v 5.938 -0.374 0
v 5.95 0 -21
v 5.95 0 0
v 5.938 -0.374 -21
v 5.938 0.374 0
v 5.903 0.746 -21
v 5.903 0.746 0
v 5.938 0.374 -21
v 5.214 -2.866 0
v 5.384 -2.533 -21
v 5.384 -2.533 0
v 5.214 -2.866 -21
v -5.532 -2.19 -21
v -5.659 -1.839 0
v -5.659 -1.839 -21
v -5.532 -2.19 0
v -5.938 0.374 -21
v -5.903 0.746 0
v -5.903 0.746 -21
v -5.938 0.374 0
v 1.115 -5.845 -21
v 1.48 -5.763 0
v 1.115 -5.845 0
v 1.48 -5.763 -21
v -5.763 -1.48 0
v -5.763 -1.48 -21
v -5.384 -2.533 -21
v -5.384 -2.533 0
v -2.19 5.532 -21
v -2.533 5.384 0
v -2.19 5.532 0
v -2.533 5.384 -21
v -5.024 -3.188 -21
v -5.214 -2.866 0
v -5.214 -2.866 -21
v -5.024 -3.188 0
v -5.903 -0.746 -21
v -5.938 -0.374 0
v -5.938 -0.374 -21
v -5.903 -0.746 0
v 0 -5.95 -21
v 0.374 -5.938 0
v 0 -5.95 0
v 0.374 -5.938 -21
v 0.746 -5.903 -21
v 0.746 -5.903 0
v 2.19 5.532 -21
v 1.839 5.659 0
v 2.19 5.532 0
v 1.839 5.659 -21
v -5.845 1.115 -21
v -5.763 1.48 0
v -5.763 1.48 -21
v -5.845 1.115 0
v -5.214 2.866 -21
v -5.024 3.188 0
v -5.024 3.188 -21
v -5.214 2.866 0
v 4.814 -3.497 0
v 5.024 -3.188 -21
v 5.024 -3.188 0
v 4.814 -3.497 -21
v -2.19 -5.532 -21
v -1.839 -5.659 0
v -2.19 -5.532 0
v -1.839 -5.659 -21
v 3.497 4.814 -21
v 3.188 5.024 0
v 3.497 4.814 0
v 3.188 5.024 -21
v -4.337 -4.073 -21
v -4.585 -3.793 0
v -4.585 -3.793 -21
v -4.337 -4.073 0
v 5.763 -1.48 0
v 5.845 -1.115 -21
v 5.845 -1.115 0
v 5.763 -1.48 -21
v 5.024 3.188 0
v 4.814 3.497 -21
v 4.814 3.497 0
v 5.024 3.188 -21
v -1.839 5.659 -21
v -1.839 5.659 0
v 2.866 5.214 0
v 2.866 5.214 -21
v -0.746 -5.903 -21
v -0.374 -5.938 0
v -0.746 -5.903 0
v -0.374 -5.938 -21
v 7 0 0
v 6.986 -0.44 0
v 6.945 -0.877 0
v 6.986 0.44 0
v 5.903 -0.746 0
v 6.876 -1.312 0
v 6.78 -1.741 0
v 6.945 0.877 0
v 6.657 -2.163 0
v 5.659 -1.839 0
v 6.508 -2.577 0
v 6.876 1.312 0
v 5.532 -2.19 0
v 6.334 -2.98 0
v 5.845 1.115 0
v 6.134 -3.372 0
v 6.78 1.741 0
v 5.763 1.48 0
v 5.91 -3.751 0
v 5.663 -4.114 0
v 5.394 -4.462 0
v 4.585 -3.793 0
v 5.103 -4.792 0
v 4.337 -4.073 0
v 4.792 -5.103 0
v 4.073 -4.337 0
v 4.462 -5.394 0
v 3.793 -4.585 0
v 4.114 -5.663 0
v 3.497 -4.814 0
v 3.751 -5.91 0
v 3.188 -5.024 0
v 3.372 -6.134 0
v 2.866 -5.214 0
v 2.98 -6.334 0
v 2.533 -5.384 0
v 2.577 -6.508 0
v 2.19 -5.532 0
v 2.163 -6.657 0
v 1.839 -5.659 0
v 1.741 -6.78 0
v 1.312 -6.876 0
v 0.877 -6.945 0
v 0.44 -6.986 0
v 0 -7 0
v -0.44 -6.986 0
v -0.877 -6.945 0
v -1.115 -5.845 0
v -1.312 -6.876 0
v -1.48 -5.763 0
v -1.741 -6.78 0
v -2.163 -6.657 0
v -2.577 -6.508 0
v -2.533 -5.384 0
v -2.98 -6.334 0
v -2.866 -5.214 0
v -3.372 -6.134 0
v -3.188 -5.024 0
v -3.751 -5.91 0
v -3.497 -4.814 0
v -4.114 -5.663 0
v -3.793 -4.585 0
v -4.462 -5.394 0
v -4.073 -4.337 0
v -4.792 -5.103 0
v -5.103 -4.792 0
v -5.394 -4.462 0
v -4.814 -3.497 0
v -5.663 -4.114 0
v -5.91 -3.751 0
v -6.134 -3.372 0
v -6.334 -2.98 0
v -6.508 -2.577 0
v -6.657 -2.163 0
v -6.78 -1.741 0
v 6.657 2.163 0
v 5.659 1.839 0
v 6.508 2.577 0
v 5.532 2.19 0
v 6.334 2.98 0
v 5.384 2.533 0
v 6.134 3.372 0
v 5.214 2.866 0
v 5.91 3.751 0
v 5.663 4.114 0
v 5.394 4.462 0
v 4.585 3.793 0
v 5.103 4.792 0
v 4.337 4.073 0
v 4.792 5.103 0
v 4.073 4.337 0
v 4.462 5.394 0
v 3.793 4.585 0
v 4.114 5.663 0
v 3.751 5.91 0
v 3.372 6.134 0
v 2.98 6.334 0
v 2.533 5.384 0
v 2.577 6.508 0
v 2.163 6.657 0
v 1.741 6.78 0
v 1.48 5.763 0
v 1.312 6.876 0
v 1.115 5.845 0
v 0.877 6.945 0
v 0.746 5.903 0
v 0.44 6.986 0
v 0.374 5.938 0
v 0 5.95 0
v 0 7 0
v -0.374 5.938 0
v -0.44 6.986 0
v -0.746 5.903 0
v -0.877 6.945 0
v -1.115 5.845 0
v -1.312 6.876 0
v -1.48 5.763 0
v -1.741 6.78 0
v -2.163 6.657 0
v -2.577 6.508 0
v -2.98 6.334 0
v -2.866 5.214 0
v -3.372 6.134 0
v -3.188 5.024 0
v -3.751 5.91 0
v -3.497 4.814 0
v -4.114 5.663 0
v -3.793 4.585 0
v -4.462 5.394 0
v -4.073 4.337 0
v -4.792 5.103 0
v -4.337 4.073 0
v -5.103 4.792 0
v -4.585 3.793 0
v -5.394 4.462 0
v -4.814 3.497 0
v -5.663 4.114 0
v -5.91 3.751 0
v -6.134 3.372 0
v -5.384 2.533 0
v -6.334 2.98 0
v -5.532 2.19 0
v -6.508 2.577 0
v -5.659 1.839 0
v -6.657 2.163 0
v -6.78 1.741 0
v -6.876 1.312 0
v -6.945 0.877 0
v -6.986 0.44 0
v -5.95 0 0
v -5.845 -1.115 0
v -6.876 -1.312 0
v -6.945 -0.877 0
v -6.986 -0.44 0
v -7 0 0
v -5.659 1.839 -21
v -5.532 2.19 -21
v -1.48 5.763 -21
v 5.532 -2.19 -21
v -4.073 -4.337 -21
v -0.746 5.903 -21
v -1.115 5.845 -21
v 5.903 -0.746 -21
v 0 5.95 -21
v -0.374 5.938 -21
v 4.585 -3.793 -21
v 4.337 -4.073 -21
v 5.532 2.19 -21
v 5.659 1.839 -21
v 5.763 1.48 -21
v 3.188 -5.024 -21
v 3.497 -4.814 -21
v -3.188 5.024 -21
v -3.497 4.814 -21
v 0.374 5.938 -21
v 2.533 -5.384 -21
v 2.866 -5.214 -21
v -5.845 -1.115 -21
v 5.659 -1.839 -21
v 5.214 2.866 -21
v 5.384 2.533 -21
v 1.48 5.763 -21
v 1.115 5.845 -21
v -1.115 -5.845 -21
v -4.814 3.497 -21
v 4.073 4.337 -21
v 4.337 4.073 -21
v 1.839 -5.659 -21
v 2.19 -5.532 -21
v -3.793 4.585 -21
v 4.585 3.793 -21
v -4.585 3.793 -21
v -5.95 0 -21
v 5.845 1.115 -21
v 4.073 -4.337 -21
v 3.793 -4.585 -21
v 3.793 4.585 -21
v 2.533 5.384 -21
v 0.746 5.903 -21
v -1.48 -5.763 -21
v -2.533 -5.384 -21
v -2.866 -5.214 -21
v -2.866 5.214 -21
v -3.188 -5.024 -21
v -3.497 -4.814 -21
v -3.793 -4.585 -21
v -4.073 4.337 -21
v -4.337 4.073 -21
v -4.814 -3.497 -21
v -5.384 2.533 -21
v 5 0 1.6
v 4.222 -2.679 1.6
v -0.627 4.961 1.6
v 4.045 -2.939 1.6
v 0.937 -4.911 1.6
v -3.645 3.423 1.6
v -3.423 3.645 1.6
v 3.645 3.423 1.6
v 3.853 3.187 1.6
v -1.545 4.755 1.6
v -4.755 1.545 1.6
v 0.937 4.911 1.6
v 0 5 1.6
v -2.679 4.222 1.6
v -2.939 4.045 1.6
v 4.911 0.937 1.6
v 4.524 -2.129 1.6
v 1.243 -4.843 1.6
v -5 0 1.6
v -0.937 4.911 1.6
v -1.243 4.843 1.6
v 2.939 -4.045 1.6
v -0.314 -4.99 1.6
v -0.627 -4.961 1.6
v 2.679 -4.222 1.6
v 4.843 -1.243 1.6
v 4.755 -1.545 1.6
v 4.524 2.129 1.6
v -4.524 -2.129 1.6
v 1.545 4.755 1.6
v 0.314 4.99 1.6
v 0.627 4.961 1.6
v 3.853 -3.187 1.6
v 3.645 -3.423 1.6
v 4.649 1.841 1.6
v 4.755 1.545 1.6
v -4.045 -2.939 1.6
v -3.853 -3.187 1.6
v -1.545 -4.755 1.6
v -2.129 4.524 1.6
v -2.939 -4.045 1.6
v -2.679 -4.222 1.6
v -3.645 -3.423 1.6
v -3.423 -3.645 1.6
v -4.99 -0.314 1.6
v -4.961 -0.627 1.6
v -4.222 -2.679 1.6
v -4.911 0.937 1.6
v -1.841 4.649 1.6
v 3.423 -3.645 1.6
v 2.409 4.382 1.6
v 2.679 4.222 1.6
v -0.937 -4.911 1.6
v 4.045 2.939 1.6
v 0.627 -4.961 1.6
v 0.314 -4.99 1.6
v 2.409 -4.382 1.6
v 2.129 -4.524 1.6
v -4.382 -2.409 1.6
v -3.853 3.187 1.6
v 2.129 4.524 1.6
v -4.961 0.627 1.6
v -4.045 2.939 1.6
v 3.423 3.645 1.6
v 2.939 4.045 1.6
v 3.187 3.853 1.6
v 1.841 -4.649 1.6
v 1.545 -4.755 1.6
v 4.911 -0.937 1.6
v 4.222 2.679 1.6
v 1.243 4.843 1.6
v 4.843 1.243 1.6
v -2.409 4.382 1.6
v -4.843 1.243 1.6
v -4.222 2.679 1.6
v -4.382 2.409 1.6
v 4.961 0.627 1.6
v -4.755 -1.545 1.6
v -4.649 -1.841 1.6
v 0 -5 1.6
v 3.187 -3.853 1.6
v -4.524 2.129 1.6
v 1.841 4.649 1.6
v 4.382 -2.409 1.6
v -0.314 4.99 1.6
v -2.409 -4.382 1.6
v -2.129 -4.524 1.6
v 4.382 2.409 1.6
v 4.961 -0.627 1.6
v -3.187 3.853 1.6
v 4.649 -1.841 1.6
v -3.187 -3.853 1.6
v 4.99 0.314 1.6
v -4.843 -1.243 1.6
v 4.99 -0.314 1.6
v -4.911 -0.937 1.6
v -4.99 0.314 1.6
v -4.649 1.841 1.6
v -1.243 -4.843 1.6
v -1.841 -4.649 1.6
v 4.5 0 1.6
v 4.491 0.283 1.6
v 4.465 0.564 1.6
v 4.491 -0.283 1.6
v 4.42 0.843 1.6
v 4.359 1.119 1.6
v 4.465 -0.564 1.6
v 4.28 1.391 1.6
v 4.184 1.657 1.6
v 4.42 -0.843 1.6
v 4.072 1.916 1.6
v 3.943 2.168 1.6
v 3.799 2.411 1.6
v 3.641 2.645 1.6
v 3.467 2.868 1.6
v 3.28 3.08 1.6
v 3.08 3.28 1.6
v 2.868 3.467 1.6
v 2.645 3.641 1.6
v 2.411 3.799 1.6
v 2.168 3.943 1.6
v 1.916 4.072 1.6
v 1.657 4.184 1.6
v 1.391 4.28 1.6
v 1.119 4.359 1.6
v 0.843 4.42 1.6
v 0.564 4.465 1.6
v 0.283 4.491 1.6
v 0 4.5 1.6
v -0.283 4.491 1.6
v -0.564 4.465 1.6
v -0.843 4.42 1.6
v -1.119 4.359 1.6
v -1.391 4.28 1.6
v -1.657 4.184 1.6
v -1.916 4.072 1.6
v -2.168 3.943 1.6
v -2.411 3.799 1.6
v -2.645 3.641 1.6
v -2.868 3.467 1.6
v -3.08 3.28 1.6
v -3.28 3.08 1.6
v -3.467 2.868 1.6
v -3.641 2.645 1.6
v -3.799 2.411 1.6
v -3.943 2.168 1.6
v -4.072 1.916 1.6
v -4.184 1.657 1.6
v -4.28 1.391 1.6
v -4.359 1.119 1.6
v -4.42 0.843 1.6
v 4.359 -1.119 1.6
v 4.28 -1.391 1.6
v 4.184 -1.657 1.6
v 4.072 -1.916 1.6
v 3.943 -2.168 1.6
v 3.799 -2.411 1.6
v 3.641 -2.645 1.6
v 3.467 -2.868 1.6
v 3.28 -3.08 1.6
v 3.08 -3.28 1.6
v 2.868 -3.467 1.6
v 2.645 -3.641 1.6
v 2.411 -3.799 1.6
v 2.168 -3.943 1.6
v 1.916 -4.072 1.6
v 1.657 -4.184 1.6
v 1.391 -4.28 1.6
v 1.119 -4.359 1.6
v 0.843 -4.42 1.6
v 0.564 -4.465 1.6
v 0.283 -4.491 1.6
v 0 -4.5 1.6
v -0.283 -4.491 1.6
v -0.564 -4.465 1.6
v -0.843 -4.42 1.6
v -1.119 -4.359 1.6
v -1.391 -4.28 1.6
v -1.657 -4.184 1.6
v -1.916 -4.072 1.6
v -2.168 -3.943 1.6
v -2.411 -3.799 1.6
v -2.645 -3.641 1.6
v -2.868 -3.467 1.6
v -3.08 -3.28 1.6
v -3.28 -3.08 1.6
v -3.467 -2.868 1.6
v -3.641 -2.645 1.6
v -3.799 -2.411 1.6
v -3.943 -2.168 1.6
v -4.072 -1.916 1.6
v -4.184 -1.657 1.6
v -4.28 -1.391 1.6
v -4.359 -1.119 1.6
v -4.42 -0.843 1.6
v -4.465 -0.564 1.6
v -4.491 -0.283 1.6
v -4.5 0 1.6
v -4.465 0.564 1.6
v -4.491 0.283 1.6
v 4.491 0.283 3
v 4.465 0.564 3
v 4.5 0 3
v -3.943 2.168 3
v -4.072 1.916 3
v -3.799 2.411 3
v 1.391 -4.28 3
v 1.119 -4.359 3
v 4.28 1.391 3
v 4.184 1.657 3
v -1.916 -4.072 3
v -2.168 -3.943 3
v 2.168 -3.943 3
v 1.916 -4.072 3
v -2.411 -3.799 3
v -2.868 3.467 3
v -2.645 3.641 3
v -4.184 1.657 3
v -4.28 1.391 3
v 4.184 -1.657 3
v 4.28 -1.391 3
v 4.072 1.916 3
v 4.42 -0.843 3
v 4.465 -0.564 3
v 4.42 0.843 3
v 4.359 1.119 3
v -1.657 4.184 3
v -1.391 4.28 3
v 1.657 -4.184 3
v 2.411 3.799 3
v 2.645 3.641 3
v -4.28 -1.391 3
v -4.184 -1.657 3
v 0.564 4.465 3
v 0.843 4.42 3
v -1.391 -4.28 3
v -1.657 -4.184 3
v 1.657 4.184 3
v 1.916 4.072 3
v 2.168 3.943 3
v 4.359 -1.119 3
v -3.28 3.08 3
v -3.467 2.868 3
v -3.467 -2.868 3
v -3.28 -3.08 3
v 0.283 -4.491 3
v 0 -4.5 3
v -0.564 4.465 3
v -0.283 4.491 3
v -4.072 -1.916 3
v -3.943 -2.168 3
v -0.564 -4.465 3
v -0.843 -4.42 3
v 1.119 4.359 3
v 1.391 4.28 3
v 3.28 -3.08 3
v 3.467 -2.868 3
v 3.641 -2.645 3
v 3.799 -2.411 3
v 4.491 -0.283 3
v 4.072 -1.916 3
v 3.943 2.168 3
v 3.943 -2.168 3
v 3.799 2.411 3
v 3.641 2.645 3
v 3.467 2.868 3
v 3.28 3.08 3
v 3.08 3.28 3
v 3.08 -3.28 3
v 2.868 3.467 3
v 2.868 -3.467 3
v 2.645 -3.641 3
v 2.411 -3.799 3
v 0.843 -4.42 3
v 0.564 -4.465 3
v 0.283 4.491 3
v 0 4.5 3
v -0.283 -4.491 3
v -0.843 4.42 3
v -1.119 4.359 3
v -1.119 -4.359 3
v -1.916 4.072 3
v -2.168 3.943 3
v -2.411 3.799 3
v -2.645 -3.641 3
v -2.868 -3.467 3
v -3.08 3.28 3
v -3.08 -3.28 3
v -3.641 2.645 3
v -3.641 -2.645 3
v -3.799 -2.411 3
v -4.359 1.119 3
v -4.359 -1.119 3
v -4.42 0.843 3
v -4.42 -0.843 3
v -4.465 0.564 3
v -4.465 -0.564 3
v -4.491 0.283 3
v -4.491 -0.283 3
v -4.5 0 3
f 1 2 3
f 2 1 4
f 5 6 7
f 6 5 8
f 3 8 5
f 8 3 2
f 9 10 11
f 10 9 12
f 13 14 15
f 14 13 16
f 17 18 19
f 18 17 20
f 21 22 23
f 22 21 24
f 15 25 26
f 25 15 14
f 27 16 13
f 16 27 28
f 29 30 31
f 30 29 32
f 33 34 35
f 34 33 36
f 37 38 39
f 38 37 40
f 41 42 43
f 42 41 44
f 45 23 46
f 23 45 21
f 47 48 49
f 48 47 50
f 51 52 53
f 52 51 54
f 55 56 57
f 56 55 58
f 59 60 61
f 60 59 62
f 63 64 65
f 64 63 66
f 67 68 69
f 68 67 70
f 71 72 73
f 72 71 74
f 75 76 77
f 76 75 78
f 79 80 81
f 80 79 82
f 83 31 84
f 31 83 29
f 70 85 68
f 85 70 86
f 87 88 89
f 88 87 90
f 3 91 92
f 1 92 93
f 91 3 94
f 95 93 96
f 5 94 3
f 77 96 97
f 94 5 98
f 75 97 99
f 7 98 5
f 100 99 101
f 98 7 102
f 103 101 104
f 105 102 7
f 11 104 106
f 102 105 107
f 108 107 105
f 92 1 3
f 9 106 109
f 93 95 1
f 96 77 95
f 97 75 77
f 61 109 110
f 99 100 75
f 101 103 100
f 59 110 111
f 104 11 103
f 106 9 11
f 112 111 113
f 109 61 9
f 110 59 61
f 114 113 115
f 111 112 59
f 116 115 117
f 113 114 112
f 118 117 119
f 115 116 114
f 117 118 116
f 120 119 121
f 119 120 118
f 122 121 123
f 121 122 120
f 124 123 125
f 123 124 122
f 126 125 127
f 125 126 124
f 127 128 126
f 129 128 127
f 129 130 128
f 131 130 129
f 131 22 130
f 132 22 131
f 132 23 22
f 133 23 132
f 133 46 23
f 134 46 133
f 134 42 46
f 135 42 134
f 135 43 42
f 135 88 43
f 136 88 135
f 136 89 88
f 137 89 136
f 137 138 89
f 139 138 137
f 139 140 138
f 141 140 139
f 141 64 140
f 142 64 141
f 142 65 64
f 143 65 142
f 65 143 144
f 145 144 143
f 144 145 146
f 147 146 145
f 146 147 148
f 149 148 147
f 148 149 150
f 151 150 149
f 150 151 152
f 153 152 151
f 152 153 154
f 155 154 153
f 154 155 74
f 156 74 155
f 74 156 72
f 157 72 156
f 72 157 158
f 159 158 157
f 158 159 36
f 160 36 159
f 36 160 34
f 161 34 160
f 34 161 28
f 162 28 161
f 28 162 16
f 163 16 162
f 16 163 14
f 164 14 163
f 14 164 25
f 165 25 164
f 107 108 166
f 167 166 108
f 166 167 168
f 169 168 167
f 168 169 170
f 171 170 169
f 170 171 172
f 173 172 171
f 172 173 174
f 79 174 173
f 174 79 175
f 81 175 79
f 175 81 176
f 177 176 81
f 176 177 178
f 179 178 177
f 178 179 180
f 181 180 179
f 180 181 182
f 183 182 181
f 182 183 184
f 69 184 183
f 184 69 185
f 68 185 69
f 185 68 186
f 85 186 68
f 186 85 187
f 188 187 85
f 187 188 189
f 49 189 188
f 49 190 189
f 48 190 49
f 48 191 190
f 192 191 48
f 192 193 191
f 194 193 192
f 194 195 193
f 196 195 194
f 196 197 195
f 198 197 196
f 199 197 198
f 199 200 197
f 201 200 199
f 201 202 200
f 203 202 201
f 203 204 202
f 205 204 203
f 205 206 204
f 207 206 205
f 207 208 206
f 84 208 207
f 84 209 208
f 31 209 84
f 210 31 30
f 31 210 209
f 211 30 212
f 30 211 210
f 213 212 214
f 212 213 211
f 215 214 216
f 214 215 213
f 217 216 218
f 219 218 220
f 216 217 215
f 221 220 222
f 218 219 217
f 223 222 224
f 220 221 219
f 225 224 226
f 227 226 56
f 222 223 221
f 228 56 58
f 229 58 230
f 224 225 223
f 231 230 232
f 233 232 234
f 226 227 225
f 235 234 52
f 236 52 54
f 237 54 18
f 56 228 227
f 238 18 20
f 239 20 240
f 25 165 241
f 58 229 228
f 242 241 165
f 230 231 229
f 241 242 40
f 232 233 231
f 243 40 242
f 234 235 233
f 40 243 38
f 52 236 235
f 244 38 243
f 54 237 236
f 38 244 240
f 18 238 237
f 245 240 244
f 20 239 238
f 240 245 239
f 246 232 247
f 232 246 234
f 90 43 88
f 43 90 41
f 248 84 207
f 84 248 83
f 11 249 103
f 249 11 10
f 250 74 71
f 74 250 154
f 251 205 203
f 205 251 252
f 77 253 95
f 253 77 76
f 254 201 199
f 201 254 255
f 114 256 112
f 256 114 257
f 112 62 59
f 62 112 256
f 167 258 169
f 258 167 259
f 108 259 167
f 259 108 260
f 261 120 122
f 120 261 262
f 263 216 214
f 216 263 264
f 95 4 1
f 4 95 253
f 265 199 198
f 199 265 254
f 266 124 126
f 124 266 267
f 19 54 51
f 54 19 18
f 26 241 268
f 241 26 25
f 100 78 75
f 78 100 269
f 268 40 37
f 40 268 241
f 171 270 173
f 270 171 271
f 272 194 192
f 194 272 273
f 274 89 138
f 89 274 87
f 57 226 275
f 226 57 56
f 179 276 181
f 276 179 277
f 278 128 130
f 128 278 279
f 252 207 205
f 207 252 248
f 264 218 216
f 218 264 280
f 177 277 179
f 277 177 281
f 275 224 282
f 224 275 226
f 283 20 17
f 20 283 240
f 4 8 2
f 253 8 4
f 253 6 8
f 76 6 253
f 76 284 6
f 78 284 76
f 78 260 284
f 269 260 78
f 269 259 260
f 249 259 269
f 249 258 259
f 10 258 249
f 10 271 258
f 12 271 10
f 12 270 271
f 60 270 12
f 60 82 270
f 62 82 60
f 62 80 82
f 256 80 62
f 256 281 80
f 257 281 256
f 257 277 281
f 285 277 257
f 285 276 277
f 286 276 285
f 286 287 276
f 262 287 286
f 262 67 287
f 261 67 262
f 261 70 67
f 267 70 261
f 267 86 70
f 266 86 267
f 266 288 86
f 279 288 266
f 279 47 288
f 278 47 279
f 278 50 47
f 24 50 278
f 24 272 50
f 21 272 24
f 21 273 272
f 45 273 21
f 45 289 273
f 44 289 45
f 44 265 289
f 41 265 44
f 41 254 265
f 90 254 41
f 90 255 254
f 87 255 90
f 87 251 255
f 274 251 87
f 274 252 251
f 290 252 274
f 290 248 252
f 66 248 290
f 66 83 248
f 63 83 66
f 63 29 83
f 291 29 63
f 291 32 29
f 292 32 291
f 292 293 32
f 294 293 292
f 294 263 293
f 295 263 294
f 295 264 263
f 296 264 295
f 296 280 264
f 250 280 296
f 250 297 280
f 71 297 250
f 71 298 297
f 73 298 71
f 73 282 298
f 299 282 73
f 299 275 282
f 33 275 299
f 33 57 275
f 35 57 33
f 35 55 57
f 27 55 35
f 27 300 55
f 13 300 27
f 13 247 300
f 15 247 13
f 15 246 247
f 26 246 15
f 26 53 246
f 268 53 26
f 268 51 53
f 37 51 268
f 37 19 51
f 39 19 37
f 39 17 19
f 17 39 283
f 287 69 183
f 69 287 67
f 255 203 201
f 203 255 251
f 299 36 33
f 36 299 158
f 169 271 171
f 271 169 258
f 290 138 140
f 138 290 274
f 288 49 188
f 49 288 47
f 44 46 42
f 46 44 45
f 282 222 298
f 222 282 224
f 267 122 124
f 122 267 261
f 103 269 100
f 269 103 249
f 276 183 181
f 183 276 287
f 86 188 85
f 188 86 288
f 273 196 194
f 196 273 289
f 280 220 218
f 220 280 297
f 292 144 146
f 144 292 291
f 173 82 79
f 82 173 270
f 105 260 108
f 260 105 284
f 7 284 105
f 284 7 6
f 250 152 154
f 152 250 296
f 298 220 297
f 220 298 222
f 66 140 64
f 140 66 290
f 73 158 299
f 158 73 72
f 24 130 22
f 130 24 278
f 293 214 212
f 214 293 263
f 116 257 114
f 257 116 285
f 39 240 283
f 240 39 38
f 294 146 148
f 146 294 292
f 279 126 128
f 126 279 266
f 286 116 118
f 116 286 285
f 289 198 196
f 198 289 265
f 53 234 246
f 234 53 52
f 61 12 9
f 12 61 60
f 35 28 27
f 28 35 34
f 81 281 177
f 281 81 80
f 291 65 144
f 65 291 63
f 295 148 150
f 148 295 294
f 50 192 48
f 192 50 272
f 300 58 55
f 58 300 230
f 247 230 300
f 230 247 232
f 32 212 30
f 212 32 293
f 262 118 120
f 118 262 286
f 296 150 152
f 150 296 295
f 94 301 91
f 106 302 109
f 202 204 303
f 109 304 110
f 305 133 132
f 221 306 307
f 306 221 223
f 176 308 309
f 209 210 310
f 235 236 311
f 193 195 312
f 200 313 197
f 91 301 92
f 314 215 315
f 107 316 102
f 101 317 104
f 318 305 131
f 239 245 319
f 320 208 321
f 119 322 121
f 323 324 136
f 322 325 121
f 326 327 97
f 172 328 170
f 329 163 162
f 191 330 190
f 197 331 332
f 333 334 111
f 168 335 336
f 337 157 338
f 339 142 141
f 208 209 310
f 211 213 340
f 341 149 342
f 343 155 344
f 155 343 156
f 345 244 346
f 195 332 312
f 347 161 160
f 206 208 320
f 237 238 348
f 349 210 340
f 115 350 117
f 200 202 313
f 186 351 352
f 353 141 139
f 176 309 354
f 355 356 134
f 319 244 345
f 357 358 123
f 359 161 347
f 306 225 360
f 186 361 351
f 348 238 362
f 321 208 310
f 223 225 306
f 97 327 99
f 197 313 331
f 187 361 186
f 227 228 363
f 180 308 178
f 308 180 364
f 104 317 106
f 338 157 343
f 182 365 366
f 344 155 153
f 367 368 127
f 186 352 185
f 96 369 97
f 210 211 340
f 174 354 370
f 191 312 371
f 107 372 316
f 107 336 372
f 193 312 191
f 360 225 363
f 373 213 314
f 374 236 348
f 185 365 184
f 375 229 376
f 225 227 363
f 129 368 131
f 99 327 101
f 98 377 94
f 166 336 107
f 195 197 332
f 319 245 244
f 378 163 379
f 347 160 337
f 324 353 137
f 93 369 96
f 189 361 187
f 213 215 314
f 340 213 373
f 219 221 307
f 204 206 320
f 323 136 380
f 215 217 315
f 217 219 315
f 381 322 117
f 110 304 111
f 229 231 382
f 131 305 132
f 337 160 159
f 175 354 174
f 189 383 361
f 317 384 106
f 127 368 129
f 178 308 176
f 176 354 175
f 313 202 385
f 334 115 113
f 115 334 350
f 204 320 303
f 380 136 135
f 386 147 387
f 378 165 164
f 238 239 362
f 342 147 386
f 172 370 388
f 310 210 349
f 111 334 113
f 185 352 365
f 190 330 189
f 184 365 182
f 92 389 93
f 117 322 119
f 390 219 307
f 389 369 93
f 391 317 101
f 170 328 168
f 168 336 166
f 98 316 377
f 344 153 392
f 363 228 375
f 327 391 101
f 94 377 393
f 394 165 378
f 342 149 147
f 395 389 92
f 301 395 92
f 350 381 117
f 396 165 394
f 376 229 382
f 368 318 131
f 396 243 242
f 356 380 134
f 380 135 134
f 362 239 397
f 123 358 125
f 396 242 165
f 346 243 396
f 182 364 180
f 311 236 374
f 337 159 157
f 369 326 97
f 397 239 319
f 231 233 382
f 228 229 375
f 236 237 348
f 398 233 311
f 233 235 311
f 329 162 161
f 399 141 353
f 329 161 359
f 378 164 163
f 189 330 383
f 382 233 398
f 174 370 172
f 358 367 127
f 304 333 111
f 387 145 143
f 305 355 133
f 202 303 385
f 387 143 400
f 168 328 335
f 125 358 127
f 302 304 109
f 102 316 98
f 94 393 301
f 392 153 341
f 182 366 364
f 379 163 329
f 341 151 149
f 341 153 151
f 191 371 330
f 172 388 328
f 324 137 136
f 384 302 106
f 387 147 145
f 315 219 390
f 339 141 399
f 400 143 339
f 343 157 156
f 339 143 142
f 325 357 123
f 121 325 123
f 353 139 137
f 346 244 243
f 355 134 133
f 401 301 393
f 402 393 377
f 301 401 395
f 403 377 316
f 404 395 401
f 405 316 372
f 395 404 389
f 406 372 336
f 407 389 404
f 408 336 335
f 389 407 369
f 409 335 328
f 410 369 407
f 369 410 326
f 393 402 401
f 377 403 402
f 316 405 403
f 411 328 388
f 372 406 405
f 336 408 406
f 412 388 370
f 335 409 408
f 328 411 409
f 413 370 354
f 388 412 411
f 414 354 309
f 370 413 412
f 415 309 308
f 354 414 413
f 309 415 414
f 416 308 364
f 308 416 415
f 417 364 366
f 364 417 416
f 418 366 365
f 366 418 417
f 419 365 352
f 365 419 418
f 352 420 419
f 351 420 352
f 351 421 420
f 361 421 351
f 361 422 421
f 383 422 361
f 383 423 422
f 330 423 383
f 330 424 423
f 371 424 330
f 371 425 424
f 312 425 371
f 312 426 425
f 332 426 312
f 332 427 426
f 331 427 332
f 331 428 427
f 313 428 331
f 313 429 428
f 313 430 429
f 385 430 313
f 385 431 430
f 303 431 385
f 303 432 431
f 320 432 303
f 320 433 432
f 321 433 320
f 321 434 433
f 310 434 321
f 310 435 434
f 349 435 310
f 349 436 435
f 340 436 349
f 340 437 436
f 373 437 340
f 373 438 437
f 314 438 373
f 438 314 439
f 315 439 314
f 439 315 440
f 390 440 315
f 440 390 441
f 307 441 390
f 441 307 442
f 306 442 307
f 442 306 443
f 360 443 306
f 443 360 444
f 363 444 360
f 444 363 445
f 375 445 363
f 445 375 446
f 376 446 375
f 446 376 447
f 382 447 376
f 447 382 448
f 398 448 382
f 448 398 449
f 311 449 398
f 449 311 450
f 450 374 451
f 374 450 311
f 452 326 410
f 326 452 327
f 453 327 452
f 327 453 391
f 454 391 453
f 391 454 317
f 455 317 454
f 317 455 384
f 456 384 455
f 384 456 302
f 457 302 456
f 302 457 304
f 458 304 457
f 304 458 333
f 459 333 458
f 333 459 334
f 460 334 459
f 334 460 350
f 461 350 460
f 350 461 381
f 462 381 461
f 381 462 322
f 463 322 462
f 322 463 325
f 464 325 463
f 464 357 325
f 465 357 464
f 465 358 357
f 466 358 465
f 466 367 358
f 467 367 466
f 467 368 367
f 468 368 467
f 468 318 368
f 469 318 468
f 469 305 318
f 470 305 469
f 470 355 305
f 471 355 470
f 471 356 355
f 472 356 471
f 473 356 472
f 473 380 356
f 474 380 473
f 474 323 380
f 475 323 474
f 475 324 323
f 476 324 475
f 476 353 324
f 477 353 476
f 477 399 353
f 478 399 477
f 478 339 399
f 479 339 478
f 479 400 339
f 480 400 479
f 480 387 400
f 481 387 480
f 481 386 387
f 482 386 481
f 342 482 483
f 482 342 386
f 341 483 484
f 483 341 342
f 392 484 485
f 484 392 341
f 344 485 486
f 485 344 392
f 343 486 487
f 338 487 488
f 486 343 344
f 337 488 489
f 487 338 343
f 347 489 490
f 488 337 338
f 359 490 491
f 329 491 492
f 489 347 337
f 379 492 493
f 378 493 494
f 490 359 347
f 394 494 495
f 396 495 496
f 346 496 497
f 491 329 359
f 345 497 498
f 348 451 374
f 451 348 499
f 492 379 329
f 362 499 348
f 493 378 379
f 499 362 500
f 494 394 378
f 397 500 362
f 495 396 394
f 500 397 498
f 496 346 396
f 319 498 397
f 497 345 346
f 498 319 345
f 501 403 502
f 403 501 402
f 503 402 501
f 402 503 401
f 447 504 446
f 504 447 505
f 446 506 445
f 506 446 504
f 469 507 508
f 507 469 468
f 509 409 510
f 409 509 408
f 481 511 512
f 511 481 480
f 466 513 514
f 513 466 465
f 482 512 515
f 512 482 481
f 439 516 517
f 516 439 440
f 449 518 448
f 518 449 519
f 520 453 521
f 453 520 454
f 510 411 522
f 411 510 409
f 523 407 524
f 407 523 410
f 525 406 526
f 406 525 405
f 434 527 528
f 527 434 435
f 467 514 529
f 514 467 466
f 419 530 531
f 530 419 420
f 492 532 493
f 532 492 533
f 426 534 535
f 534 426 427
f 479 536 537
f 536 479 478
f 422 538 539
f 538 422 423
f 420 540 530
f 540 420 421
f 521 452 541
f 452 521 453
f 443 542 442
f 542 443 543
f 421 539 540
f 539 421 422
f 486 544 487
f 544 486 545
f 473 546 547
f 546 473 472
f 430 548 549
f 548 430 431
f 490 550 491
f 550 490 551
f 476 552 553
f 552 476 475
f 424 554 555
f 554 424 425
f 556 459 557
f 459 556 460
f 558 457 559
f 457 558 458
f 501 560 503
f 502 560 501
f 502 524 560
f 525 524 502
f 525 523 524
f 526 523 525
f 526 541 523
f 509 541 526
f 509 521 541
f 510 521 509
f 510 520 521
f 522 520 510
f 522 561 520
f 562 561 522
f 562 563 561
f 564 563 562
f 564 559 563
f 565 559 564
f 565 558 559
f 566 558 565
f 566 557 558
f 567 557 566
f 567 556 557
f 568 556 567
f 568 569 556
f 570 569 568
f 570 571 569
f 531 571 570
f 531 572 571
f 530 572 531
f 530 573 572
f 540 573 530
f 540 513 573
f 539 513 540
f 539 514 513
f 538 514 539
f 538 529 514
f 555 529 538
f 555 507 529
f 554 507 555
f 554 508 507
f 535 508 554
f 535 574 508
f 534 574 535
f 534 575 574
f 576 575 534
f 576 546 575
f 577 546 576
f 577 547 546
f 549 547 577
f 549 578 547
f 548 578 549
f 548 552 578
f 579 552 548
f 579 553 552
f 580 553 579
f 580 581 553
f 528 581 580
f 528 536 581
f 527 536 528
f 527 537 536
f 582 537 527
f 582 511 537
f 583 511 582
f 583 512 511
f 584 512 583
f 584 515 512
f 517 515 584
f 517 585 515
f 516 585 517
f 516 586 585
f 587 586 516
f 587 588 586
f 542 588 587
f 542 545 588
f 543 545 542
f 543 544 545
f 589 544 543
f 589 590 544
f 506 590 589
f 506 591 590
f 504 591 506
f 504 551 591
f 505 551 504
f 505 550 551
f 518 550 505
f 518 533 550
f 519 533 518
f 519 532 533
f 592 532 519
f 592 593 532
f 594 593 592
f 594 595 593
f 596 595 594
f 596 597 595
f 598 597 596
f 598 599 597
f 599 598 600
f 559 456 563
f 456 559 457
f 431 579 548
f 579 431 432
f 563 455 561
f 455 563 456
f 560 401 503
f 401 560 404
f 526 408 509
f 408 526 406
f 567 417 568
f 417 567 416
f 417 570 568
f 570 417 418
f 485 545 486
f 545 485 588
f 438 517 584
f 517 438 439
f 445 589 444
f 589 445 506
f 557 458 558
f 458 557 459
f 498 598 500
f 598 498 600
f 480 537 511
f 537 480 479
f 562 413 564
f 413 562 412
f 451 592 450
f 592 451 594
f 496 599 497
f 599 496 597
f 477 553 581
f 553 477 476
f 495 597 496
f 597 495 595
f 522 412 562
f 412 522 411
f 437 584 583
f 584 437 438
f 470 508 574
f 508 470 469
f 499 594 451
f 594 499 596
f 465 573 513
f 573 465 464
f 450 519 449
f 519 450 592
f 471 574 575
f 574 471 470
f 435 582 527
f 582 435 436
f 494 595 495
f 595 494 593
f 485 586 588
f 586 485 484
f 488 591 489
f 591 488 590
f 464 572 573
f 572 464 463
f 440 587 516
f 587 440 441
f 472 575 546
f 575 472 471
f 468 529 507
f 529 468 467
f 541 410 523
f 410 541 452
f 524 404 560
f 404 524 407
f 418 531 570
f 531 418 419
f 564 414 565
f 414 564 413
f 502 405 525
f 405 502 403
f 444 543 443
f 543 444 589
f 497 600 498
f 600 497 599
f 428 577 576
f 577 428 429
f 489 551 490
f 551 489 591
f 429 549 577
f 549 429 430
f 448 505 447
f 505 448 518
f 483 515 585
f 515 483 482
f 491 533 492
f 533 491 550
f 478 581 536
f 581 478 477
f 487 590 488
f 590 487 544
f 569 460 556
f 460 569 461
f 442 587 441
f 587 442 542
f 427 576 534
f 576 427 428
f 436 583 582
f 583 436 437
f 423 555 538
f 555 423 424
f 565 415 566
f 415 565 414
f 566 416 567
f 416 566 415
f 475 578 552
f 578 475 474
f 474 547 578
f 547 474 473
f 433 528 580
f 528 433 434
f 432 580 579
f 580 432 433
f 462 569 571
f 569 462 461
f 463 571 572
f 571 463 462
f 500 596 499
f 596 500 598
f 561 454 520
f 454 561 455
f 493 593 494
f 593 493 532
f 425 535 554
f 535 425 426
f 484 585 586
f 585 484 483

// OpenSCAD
/**
 * onOffButton
 * @name onOffButton
 * @description Simple On Off button
 * @type asset
 * @parent 
 */
module onOffButton(
    $fn = 100
) {

    bottom_part_z_size = 6 + 12 + (6 / 2);
    bottom_part_diameter = 11.90; // M12 * 0.75

    support_z_size = 1.6;
    support_diameter_1 = 14;
    support_diameter_2 = 9 + 1;

    button_z_size = 3;
    button_diameter = 9;

    translate([0, 0, -bottom_part_z_size])
        cylinder(h=bottom_part_z_size, d=bottom_part_diameter, $fn = $fn);

    cylinder(
        h = support_z_size,
        d1 = support_diameter_1,
        d2 = support_diameter_2,
        $fn = $fn
    );

    cylinder(
        h = button_z_size,
        d = button_diameter,
        $fn = $fn
    );
}

onOffButton();
